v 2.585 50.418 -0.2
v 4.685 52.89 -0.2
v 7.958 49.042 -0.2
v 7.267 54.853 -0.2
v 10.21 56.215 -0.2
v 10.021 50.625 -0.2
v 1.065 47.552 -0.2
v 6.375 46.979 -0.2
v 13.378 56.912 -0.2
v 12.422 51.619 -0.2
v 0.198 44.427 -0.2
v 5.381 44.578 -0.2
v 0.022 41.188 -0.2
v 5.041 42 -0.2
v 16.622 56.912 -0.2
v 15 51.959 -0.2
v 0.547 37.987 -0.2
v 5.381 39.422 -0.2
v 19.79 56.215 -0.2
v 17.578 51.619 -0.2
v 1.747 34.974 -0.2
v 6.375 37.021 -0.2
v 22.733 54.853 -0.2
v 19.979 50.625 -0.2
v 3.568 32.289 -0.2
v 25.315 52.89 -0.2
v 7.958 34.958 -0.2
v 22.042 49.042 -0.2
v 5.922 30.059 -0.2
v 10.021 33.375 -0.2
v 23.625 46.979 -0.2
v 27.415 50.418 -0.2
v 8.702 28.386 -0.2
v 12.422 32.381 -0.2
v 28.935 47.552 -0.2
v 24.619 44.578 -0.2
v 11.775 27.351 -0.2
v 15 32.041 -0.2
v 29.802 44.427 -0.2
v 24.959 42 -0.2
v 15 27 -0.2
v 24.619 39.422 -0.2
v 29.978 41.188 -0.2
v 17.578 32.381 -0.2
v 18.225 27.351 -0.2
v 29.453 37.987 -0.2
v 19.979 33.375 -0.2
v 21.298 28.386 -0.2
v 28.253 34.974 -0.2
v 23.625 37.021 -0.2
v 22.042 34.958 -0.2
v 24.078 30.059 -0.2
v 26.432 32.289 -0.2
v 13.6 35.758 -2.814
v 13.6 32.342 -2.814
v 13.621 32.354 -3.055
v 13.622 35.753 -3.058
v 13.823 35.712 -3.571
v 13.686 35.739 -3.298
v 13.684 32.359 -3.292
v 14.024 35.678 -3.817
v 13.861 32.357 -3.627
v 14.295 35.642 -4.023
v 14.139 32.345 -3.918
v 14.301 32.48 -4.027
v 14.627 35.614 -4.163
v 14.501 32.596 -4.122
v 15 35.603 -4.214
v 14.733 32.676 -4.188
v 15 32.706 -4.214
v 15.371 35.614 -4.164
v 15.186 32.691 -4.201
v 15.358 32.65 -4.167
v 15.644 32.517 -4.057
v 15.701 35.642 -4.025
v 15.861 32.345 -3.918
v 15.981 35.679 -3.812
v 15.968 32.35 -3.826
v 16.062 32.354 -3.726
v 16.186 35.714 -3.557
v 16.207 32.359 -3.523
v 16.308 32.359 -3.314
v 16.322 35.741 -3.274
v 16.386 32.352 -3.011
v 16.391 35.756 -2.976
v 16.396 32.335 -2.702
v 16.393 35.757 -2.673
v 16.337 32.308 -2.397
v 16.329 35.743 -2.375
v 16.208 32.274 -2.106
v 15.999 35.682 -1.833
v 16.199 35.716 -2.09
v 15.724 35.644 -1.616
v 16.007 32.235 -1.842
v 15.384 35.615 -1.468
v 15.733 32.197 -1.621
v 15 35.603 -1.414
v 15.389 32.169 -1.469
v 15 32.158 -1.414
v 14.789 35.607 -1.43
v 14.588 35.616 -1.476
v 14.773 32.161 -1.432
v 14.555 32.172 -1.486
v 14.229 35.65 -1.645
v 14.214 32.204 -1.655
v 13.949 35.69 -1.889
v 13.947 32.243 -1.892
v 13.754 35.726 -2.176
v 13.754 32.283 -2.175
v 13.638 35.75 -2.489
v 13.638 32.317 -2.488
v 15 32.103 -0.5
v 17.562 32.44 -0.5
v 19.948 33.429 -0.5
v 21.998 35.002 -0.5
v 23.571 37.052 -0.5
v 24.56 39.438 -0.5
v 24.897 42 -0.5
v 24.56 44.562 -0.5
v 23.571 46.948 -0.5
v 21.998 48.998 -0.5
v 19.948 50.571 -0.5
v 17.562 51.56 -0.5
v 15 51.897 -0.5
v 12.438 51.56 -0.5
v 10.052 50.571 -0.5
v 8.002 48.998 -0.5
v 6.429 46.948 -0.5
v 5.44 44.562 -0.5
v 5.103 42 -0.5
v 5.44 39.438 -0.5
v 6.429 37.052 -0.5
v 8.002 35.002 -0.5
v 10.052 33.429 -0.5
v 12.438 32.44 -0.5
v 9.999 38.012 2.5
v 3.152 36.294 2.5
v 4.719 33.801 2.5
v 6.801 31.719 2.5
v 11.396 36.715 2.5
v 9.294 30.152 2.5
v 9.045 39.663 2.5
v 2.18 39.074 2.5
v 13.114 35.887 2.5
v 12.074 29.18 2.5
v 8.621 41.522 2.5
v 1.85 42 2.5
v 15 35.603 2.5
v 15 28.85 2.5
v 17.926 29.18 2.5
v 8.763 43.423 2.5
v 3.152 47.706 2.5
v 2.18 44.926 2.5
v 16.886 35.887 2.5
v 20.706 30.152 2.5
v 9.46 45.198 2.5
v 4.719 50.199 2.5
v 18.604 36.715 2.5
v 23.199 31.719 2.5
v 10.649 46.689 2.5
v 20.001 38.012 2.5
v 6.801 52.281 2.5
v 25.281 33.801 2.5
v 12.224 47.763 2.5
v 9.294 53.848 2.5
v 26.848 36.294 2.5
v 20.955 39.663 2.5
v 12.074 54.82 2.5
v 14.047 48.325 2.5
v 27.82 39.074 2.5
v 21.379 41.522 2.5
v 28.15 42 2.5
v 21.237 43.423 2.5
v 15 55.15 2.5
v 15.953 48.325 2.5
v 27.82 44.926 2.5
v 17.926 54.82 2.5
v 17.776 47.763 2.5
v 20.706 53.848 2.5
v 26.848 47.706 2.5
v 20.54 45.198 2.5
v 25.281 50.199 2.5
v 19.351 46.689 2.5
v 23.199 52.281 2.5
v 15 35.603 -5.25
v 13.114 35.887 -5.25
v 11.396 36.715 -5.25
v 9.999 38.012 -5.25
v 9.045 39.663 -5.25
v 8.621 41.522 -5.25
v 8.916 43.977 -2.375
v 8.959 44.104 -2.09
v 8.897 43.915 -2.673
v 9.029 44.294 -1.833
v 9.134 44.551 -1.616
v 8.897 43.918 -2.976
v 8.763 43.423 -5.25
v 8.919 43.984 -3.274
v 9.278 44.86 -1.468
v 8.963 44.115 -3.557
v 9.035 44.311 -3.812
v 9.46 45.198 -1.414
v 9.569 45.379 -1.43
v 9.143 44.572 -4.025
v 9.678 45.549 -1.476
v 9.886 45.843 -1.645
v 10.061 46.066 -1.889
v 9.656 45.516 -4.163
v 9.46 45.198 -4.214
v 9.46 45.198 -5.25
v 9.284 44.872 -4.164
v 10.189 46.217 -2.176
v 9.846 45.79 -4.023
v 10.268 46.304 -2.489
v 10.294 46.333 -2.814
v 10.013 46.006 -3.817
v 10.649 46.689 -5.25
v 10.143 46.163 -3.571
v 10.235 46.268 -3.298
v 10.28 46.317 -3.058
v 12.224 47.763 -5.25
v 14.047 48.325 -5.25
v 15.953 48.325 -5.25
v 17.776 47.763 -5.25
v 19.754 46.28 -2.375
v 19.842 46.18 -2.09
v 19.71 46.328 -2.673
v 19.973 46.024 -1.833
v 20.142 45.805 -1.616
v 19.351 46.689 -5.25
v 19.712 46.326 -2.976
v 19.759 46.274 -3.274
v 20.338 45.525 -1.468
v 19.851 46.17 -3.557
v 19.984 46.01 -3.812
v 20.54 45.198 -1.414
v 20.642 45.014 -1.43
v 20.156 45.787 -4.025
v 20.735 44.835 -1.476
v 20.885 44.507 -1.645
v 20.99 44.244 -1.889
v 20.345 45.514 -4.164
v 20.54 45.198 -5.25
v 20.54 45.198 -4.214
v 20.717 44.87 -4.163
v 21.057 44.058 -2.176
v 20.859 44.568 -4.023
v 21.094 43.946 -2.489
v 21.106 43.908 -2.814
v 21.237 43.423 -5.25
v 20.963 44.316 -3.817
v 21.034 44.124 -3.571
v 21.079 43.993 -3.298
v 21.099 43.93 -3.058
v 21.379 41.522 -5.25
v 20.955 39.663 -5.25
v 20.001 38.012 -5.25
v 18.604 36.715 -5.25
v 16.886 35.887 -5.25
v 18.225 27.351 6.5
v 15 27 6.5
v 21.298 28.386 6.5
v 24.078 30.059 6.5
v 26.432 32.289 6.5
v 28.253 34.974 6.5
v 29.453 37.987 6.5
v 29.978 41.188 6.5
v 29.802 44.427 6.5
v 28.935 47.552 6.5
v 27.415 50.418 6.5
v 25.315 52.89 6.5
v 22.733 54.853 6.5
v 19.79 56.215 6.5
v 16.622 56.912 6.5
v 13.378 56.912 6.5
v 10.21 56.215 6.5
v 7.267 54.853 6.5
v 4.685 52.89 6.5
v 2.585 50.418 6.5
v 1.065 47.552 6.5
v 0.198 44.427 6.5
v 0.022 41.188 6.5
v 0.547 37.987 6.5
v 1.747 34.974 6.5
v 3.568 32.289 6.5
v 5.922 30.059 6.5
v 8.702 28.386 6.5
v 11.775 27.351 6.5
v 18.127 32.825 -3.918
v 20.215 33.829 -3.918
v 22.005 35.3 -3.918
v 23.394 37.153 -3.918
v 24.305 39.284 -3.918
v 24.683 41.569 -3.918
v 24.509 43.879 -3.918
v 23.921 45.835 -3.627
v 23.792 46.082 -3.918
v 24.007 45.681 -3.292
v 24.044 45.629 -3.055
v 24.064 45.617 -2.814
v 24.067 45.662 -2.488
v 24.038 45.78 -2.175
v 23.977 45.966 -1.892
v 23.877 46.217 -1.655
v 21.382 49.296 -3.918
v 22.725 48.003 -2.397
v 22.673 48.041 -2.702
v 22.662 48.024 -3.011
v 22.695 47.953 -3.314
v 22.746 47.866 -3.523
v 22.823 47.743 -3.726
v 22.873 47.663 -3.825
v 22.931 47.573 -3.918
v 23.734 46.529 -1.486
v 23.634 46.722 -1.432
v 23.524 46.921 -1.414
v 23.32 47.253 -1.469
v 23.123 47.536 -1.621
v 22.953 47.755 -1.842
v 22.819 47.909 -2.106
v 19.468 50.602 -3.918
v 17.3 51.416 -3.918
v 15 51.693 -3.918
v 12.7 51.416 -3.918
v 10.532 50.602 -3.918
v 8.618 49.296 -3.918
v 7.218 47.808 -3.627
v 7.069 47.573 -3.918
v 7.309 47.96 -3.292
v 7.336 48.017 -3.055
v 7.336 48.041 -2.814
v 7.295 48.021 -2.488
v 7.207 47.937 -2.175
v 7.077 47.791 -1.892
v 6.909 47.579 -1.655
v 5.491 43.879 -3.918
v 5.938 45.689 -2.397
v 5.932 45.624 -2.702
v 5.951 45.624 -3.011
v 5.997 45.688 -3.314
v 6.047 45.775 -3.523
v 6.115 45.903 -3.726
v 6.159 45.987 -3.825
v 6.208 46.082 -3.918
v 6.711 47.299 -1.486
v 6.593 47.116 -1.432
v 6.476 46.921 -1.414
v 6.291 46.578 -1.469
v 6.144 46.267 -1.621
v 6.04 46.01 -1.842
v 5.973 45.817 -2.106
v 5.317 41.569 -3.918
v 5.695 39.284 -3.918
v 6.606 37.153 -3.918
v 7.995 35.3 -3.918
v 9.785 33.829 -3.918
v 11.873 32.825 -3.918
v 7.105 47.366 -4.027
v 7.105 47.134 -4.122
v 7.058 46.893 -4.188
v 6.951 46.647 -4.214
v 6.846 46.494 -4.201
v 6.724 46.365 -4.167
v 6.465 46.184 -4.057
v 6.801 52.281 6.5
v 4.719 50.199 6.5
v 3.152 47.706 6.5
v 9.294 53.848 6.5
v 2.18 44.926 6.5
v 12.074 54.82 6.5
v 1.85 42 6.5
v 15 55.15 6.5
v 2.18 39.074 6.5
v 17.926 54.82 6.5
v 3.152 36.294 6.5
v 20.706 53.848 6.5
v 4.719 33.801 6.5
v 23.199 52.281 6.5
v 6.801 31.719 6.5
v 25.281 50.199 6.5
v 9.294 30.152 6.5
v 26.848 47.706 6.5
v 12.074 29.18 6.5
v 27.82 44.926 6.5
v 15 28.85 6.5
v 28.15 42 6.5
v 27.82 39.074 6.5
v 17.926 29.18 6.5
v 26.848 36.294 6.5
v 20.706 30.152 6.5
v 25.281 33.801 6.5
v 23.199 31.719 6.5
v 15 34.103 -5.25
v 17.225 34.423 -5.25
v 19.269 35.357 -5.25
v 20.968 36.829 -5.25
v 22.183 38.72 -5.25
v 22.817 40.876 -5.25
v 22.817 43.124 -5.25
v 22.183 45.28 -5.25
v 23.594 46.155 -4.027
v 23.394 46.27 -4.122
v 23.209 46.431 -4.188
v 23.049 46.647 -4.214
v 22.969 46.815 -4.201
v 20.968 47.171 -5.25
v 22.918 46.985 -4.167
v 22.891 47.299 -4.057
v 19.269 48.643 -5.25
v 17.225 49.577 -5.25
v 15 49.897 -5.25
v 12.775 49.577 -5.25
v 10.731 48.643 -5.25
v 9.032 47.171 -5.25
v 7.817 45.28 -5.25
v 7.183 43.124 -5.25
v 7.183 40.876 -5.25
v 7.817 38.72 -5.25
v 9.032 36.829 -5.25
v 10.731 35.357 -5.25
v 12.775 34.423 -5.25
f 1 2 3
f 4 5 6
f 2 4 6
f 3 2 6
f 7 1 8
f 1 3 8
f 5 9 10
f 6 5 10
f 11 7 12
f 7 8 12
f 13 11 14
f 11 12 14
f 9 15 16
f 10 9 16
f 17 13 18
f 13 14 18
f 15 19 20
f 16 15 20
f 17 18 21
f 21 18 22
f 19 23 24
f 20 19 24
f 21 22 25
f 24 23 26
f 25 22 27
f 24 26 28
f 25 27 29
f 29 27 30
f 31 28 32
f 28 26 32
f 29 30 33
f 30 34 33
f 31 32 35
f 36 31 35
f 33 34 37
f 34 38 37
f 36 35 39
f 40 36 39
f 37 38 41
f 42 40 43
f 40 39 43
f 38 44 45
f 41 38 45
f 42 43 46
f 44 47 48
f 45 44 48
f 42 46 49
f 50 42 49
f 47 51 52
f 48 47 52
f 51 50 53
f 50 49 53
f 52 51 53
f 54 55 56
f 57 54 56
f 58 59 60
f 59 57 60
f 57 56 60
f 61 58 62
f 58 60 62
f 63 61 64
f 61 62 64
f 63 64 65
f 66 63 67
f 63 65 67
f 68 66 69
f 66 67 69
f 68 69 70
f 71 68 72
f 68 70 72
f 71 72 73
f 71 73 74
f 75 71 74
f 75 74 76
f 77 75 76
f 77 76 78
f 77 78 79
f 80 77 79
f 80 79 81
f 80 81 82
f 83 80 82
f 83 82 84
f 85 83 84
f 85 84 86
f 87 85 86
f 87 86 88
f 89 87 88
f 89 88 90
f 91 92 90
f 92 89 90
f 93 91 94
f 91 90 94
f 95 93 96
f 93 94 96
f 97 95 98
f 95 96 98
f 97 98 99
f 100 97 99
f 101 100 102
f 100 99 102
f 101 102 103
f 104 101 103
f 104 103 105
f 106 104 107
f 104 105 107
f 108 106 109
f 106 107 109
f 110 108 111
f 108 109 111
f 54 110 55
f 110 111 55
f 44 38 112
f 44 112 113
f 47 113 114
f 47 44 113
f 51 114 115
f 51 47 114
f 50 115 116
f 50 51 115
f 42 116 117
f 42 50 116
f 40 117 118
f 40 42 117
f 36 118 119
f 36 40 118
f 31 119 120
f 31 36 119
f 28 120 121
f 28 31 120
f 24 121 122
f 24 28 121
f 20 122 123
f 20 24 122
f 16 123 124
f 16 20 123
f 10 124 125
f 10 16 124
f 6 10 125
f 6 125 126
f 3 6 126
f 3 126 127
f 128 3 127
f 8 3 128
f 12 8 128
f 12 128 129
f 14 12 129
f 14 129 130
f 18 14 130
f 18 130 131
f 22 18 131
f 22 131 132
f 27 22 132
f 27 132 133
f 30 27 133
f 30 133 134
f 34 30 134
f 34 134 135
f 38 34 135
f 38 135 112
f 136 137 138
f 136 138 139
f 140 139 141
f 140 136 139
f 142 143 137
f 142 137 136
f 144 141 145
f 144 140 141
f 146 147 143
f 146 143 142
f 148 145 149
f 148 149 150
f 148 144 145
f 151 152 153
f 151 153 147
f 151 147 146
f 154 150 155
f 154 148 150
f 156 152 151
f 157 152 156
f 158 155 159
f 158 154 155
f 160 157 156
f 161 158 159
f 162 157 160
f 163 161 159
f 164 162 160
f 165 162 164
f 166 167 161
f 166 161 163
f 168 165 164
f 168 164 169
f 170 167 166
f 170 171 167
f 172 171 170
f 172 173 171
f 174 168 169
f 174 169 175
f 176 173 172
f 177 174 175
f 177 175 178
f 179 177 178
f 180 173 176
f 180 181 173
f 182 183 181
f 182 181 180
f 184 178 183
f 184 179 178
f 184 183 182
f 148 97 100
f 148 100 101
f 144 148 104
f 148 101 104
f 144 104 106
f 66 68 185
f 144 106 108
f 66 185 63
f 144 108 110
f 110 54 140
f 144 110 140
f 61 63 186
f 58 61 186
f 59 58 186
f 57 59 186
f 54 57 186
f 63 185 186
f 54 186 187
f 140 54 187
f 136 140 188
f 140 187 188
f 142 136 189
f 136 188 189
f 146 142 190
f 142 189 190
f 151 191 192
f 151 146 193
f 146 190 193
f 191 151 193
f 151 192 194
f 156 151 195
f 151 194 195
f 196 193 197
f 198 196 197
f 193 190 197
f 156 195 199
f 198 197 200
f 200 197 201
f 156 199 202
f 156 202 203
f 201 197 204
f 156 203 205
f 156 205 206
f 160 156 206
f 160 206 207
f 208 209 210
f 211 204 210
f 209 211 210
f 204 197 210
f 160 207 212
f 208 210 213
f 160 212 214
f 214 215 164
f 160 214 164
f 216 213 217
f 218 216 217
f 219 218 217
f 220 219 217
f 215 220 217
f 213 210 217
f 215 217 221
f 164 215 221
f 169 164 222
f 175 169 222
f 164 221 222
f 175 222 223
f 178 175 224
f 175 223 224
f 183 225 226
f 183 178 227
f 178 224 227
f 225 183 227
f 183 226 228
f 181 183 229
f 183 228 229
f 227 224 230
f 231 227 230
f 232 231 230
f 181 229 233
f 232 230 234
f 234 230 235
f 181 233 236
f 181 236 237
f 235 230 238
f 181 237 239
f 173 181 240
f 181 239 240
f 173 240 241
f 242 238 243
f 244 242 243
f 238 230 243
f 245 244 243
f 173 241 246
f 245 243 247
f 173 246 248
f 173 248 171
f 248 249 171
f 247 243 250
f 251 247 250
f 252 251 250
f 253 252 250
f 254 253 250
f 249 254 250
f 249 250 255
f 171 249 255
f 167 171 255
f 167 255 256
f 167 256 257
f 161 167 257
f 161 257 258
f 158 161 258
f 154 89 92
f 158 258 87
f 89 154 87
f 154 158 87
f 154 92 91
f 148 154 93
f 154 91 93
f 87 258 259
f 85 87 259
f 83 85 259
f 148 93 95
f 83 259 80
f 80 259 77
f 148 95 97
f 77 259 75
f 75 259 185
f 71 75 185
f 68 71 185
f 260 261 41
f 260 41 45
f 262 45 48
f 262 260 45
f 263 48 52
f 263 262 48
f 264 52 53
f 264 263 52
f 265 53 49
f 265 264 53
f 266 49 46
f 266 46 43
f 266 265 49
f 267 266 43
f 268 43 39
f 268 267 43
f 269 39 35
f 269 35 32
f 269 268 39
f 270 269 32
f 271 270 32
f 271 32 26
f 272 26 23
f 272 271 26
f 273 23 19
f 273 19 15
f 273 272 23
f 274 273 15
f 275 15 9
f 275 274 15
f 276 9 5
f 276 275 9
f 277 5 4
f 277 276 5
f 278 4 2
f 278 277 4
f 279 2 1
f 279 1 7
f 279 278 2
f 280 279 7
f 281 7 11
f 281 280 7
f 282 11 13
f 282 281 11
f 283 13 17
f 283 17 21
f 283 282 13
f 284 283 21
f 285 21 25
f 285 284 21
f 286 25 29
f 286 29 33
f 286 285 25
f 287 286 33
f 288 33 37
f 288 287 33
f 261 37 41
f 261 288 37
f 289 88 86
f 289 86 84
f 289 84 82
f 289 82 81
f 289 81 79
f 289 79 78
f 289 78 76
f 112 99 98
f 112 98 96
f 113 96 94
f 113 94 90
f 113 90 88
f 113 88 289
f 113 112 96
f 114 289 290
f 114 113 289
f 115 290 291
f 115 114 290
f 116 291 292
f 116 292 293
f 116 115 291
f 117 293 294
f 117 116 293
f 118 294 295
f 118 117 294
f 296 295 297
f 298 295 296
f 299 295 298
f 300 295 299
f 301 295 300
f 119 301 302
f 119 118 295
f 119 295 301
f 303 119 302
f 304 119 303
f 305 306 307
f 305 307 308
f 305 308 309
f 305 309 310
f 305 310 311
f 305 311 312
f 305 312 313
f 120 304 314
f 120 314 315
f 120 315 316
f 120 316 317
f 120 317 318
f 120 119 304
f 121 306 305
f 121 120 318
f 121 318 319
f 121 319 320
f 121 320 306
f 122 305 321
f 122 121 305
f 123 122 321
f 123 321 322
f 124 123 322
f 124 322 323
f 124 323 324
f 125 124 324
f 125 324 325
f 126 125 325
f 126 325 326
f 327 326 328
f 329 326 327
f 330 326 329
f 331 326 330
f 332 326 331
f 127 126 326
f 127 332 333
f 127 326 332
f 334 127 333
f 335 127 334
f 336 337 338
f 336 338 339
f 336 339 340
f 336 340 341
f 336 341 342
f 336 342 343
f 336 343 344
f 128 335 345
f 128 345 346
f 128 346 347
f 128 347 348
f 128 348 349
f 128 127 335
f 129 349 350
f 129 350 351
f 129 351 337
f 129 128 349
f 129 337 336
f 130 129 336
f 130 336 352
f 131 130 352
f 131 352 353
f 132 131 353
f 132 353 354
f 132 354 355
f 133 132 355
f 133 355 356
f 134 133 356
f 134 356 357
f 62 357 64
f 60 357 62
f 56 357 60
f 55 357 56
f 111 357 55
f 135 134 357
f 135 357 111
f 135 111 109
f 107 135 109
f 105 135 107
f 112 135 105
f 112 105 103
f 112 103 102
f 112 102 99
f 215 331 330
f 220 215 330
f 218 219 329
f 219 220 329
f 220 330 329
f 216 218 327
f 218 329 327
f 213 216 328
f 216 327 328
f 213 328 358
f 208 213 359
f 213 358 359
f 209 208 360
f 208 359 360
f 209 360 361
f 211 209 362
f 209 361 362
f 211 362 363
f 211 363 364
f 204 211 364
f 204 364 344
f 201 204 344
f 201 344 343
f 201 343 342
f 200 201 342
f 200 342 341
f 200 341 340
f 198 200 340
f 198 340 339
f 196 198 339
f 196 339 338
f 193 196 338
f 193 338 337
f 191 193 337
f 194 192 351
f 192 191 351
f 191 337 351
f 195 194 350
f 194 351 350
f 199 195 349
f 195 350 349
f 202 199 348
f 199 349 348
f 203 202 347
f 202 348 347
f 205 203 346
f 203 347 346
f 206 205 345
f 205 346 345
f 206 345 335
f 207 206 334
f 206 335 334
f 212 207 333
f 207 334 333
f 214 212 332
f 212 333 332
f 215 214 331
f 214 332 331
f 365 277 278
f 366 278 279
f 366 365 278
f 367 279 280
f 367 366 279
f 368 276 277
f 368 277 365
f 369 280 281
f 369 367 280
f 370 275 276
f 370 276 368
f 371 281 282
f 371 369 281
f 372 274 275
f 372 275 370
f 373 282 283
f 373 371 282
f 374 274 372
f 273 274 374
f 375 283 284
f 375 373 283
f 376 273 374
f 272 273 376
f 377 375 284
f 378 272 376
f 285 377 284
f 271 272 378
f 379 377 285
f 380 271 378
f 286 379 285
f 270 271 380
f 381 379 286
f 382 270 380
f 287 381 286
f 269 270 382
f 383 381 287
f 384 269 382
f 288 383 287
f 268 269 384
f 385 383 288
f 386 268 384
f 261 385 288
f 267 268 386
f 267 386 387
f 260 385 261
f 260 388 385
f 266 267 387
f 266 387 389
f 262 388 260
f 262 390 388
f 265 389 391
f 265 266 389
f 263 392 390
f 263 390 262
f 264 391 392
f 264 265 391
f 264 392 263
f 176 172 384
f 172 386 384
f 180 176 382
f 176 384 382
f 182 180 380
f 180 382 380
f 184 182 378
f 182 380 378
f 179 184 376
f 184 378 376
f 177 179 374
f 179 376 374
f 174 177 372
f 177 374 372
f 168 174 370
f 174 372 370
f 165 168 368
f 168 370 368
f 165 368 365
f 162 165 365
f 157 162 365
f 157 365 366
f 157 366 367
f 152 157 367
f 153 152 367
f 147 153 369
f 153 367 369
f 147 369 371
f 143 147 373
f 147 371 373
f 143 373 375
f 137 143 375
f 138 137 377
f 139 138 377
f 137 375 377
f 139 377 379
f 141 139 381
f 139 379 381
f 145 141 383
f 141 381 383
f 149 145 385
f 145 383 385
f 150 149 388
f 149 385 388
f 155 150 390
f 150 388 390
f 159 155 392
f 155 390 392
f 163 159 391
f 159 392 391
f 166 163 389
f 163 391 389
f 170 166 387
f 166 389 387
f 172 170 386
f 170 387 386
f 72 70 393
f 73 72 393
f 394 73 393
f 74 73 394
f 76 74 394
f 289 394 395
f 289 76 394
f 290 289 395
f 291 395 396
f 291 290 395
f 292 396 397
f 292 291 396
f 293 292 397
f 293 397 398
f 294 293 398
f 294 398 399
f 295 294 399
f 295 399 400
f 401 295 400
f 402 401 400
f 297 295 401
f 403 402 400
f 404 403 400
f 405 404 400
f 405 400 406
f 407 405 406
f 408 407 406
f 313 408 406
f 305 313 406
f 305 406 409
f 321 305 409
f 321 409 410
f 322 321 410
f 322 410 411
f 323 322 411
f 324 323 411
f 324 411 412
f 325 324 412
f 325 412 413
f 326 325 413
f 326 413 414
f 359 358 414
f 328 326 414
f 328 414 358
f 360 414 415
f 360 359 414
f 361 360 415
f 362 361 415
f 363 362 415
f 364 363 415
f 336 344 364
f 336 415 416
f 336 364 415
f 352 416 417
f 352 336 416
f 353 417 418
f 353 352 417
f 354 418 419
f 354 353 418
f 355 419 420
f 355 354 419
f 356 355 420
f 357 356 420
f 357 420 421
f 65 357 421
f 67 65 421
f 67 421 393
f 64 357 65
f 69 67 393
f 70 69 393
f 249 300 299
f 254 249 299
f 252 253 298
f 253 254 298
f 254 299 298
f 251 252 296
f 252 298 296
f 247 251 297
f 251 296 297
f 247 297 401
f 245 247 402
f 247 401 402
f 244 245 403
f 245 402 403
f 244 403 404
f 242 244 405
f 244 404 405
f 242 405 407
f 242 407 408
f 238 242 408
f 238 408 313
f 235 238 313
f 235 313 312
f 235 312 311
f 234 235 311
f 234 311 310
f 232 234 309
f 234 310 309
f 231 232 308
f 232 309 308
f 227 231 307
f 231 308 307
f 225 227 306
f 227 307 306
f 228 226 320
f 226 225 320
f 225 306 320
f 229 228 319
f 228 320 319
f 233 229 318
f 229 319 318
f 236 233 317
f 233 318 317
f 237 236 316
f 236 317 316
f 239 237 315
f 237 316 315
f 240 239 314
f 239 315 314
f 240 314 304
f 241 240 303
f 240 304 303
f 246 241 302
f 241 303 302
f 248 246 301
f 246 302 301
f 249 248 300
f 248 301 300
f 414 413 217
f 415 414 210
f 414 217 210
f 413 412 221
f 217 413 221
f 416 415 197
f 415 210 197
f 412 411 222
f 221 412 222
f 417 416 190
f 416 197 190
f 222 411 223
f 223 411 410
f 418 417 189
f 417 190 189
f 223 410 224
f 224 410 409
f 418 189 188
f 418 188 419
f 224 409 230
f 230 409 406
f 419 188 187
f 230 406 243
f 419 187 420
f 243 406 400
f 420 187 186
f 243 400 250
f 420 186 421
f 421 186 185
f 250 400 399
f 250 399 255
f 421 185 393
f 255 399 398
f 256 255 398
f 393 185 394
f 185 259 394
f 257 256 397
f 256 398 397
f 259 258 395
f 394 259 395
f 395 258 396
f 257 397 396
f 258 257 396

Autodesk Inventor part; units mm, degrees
ref_plane "YZ Plane" through (0, 0, 0) normal (1, 0, 0) x (0, 1, 0)
ref_plane "XZ Plane" through (0, 0, 0) normal (0, 1, 0) x (-1, 0, 0)
ref_plane "XY Plane" through (0, 0, 0) normal (0, 0, 1) x (1, 0, 0)
ref_plane "Arbeitsebene1" through (15, 0, 0) normal (-1, 0, 0) x (0, 1, 0)
sketch "Skizze1" plane through (15, 0, 0) normal (-1, 0, 0) x (0, 1, 0)
  line L0 (32.6031, 0.5) -> (30.7237, 0.5) projected
  line L1 (30.7237, 4.25) -> (32.6031, 4.25) projected
  line L2 (30.7237, 0.5) -> (30.7237, 4.25) projected
  line L3 (32.6031, 0.5) -> (30.7237, 0.5) projected
  line L4 (30.7237, 4.7) -> (32.6031, 4.7) projected
  line L5 (30.7237, 0.5) -> (30.7237, 4.25) projected
  line L6 (30, 0.5) -> (32, 0.5) projected
  line L7 (30, 0.55) -> (30, 0.5) projected
  line L8 (32, 0.5) -> (32, 0.55) projected
  line L9 (32, 0.5) -> (32, 16.1)
  line L10 (52, 0.5) -> (52, 16.1)
  line L11 (42, 19.32) -> (42, -3.22)
  line L12 (32.6031, 0.5) -> (27, 0.5)
  line L13 (27, 0.5) -> (27, -6.5)
  line L14 (27, -6.5) -> (35.6031, -6.5)
  line L15 (35.6031, -6.5) -> (35.6031, 5.25)
  line L16 (35.6031, 5.25) -> (34.1031, 5.25)
  line L17 (32.6031, 0.5) -> (32.6031, 0.2)
  line L18 (32.6031, 0.2) -> (27, 0.2)
  line L19 (32, 0.55) -> (30, 0.55) projected
  line L20 (32.1031, 0.5) -> (32.0412, 0.2)
  line L21 (27, -6.5) -> (32, -6.5)
  line L22 (32, -6.5) -> (32, -14.5)
  line L23 (32, -14.5) -> (27, -14.5)
  line L24 (27, -14.5) -> (27, -6.5)
  line L25 (34.1031, 5.25) -> (32.307, 3.9176)
  line L26 (32.307, 3.9176) -> (32.1031, 0.5)
  point P0 (0, 0)
  point P1 (30.7237, 0.55)
  point P2 (32, 4.25)
  dimension "d1" = 7
  dimension "d3" = 1
  dimension "d11" = 0.5
  dimension "d13" = 15
  dimension "d14" = 8
  dimension "d15" = 10
  dimension "d37" = 0.3
  dimension "d38" = 6.3969
revolve "Umdrehung1" add sketch "Skizze1" angle 360 about axis through (15, 42, -19.32) along (0, 0, 1) contours L17 L18 L20 L0 | L0 L26 L25 L16 L15 L14 L13 L18 L17
sketch "Skizze2" plane through (0, 0, 0) normal (0, 1, 0) x (-1, 0, 0)
  spline S0 degree 3 poles (-15, -4.25) (-12.1304, -4.4784) (-9.2732, -4.7067) (-7.1109, -4.9351) (-6.8554, -4.962) (-6.6095, -4.989) (-6.3738, -5.016) knots 0 0 0 0 0.7174 0.7174 0.7174 0.802142 0.802142 0.802142 0.802142 projected
  spline S1 degree 3 poles (-14.5016, -1.0897) (-11.6314, -1.3183) (-8.8183, -1.5469) (-6.7355, -1.7755) (-6.2054, -1.8336) (-5.7215, -1.8918) (-5.2918, -1.95) knots 0.041547 0.041547 0.041547 0.041547 0.759706 0.759706 0.759706 0.942478 0.942478 0.942478 0.942478 projected
  circle A0 centre (-15, -2.8138) radius 1.4
  line L0 (-15, 1.0048) -> (-15, -6.0288) projected
  point P0 (0, 0)
  dimension "d5" = 2.8
extrude "Extrusion1" cut sketch "Skizze2" along normal up to surface
pattern_circular "Runde Anordnung1" count 3 over 360 about axis through (15, 42, 3.15) along (0, 0, -1) of "Extrusion1"
chamfer "Fase1" distance 1 angle 45 1 edges at (15, 48.3969, 6.5)
sketch "Skizze6" plane through (15, 42, 6.5) normal (0, 0, 1) x (1, 0, 0)
  circle A0 centre (0, 0) radius 15 projected
  circle A1 centre (0, 0) radius 7.3969 projected
  circle A2 centre (0, 0) radius 13.15
  circle A3 centre (0, 0) radius 9.5
  point P0 (-15, -42)
  dimension "d31" = 26.3
  dimension "d39" = 19
extrude "Extrusion4" cut sketch "Skizze6" against normal blind 4 contours A1 | A2 | A3
properties part number "30_Linear_Stage_NEMA11_baseholder_bayonetmount_objective_rms_metaladapter_tall"
